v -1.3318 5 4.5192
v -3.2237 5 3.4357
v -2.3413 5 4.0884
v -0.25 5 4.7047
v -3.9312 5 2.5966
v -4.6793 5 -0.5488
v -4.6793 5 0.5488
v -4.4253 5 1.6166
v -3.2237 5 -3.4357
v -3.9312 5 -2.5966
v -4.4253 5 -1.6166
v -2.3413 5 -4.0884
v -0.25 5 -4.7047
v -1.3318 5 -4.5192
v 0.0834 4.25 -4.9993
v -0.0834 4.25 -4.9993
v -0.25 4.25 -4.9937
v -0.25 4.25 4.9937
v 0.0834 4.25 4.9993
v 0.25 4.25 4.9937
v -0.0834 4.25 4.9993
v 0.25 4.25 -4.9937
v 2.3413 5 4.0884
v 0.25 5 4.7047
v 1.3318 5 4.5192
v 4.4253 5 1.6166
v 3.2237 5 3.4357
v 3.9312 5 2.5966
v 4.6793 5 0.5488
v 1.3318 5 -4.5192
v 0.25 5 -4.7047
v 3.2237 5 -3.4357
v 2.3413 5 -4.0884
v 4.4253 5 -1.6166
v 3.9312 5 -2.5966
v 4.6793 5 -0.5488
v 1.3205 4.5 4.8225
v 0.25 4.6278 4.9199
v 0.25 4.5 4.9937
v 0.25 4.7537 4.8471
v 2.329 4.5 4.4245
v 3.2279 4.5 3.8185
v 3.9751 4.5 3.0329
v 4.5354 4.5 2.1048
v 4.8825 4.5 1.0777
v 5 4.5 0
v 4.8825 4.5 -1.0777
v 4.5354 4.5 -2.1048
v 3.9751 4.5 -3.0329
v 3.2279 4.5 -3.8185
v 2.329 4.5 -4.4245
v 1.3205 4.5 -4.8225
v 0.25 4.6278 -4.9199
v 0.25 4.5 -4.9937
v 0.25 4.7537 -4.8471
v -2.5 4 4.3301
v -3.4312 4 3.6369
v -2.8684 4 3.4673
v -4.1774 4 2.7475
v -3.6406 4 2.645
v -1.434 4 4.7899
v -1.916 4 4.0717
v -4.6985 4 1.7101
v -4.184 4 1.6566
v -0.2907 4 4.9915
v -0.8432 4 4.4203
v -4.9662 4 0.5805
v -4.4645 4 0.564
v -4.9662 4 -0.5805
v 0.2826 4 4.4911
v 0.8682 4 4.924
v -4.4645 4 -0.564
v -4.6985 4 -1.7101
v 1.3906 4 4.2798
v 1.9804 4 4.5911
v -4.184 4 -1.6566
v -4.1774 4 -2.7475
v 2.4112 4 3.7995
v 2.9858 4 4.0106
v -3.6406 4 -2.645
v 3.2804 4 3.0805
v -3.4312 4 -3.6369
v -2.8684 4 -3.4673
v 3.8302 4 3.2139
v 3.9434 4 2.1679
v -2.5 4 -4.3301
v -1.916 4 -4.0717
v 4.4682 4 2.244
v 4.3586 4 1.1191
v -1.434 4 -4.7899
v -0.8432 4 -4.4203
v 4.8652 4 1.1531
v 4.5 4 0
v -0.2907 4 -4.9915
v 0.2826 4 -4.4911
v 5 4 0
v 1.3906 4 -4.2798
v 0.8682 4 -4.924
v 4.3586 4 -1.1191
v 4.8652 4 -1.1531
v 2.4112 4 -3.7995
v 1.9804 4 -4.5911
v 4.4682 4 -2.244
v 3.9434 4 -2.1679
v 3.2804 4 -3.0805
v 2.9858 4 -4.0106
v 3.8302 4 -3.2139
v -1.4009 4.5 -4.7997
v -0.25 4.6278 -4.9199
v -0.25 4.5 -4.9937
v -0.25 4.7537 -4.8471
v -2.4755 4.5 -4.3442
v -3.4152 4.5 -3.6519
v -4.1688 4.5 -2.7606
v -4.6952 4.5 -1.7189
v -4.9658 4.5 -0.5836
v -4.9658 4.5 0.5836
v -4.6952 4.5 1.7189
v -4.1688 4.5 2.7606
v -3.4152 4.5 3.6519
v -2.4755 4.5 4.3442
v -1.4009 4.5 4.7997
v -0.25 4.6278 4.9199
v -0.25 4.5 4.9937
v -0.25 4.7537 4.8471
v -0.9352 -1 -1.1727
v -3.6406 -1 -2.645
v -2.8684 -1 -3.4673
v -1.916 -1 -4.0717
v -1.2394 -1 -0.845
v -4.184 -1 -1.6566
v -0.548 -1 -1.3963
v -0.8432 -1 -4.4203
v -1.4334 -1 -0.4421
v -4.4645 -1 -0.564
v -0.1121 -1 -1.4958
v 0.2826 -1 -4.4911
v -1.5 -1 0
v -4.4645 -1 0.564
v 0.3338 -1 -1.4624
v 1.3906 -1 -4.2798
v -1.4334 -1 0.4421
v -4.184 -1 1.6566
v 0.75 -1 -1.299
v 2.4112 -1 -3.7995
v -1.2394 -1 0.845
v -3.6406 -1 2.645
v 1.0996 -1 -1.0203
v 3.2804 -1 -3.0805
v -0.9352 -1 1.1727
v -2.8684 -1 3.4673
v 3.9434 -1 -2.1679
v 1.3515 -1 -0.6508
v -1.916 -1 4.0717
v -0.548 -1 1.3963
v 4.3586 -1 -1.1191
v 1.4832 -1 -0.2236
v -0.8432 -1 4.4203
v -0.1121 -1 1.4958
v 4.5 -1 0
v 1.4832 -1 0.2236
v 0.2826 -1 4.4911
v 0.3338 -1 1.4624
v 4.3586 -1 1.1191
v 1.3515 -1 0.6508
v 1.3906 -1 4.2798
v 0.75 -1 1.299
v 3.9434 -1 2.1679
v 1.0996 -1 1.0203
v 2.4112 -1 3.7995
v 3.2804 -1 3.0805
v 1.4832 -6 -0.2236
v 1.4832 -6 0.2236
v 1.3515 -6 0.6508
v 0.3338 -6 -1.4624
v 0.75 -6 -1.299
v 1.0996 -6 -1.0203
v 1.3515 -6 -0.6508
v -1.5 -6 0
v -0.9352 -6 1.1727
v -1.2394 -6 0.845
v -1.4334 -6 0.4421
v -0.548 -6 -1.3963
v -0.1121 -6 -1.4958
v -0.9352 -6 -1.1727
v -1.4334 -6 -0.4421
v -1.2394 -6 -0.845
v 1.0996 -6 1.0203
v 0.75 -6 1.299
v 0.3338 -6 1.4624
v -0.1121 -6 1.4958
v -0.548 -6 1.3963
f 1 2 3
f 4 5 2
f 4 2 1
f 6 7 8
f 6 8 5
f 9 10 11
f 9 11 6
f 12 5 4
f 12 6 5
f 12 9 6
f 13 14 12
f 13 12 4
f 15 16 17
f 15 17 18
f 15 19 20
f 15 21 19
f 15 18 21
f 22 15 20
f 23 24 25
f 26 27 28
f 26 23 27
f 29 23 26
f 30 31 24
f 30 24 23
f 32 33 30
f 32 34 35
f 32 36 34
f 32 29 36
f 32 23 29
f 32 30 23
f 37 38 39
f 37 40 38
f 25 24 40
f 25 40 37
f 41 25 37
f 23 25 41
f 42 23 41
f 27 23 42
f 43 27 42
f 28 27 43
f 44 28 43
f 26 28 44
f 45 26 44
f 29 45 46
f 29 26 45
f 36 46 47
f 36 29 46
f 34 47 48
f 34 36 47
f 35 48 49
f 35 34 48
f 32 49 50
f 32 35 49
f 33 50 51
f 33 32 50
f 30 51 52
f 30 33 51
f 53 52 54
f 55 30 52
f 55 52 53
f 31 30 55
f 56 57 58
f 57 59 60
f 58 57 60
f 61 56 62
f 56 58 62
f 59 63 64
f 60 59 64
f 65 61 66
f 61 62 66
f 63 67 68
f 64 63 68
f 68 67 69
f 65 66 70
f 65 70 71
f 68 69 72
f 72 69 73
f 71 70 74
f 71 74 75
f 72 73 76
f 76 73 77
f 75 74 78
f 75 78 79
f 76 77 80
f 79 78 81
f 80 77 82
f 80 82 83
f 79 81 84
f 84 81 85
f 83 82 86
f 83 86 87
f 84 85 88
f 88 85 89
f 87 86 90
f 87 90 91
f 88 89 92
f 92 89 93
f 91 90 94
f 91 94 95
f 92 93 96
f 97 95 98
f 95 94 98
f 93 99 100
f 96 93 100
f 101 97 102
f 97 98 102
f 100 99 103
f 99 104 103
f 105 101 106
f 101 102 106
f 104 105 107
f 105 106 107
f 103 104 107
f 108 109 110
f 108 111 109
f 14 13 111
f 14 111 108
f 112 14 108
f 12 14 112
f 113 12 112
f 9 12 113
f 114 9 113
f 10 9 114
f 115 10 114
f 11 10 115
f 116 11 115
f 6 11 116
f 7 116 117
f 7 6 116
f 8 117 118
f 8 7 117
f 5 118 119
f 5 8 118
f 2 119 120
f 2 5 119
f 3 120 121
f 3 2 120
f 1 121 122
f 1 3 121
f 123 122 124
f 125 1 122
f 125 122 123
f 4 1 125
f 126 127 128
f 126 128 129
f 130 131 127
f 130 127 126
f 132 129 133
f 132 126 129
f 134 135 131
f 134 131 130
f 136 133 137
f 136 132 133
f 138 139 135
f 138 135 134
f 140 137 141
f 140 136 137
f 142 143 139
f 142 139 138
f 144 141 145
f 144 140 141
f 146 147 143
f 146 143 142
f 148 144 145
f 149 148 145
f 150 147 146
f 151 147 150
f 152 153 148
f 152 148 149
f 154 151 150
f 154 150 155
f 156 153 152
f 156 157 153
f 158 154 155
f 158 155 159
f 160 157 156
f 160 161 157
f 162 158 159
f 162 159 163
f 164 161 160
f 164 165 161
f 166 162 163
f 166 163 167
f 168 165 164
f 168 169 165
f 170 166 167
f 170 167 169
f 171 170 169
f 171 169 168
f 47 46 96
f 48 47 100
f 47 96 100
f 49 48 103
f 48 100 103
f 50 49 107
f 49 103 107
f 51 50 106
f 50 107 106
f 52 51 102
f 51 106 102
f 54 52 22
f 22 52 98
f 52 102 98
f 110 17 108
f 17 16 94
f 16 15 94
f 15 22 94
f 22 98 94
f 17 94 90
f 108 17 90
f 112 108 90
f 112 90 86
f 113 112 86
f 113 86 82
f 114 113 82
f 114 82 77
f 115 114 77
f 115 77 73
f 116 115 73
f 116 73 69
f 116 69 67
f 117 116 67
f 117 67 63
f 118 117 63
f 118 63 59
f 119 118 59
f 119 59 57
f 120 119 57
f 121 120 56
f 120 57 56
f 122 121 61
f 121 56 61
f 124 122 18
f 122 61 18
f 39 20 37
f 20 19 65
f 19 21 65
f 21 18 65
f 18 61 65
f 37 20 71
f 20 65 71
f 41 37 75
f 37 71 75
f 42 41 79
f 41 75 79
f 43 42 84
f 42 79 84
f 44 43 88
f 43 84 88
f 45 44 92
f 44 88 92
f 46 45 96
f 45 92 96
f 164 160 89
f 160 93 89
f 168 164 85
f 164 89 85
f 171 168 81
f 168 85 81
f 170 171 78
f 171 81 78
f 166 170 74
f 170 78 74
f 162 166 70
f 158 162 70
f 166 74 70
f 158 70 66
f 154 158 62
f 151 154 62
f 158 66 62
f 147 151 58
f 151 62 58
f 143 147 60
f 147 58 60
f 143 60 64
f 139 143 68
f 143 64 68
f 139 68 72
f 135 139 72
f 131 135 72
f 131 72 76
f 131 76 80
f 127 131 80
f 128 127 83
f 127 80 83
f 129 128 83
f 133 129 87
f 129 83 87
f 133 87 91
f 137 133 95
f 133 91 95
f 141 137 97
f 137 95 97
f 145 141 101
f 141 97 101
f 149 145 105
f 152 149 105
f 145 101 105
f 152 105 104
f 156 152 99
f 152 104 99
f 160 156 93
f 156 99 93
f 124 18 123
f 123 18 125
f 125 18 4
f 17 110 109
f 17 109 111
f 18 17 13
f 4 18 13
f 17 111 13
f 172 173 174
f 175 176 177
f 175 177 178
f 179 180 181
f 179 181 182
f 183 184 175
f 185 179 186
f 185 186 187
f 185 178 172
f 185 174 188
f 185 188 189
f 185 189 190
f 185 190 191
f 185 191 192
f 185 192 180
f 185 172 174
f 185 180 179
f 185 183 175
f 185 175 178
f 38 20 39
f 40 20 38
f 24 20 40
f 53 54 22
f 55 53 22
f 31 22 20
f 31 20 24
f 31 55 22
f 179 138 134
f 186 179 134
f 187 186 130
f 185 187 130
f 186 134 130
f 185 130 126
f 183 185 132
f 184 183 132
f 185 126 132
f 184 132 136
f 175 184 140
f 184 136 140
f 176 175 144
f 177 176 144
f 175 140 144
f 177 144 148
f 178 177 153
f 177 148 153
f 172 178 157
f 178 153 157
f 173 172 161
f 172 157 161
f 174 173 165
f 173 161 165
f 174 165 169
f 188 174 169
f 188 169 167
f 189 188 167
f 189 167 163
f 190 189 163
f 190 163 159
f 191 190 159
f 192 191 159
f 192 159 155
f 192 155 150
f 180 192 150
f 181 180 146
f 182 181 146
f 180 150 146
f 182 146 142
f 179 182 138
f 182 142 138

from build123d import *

# Parameters (mm, degrees)
CROQUIS1_R                 = 4.5
SALIENTE_EXTRUIR1_DEPTH    = 4
CROQUIS2_R                 = 5
SALIENTE_EXTRUIR2_DEPTH    = 1
CROQUIS3_W                 = 0.5
CROQUIS3_H                 = 4.167915925
CORTAR_EXTRUIR1_DEPTH      = 6
CORTAR_EXTRUIR1_DEPTH_BACK = 6
CHAFL_N1_SIZE              = 0.5
CHAFL_N1_SIZE2             = 0.288675135
CROQUIS4_R                 = 4.5
SALIENTE_EXTRUIR3_DEPTH    = 1
CROQUIS5_R                 = 1.5
SALIENTE_EXTRUIR4_DEPTH    = 5


with BuildPart() as part:
    # Croquis1 → Saliente-Extruir1 (new body)
    with BuildSketch(Plane(origin=(0, 0, 0), x_dir=(1, 0, 0), z_dir=(0, 1, 0))):
        Circle(CROQUIS1_R)
    extrude(amount=SALIENTE_EXTRUIR1_DEPTH)

    # Croquis2 → Saliente-Extruir2 (add)
    with BuildSketch(Plane(origin=(0, 4, 0), x_dir=(1, 0, 0), z_dir=(0, 1, 0))):
        Circle(CROQUIS2_R)
    extrude(amount=SALIENTE_EXTRUIR2_DEPTH)

    # Croquis3 → Cortar-Extruir1 (cut, two sides)
    with BuildSketch(Plane.XY) as cortar_extruir1_sk:
        with Locations((0, 6.333957963)):
            Rectangle(CROQUIS3_W, CROQUIS3_H)
    extrude(amount=CORTAR_EXTRUIR1_DEPTH, mode=Mode.SUBTRACT)
    extrude(cortar_extruir1_sk.sketch, amount=-CORTAR_EXTRUIR1_DEPTH_BACK, mode=Mode.SUBTRACT)

    # Chaflán1
    chafl_n1_edges = [part.edges().sort_by_distance(p)[0] for p in [
        (-5, 5, 0),
        (3.622844187, 5, 3.446012188),
    ]]
    chafl_n1_side = [part.faces().sort_by_distance(p)[0] for p in [
        (-5, 4.5, 0),
    ]]
    chamfer(chafl_n1_edges, length=CHAFL_N1_SIZE, length2=CHAFL_N1_SIZE2, reference=chafl_n1_side[0])

    # Croquis4 → Saliente-Extruir3 (add)
    with BuildSketch(Plane.XZ):
        Circle(CROQUIS4_R)
    extrude(amount=SALIENTE_EXTRUIR3_DEPTH)

    # Croquis5 → Saliente-Extruir4 (add)
    with BuildSketch(Plane(origin=(0, -1, 0), x_dir=(-1, 0, 0), z_dir=(0, -1, 0))):
        Circle(CROQUIS5_R)
    extrude(amount=SALIENTE_EXTRUIR4_DEPTH)


solid = part.part
